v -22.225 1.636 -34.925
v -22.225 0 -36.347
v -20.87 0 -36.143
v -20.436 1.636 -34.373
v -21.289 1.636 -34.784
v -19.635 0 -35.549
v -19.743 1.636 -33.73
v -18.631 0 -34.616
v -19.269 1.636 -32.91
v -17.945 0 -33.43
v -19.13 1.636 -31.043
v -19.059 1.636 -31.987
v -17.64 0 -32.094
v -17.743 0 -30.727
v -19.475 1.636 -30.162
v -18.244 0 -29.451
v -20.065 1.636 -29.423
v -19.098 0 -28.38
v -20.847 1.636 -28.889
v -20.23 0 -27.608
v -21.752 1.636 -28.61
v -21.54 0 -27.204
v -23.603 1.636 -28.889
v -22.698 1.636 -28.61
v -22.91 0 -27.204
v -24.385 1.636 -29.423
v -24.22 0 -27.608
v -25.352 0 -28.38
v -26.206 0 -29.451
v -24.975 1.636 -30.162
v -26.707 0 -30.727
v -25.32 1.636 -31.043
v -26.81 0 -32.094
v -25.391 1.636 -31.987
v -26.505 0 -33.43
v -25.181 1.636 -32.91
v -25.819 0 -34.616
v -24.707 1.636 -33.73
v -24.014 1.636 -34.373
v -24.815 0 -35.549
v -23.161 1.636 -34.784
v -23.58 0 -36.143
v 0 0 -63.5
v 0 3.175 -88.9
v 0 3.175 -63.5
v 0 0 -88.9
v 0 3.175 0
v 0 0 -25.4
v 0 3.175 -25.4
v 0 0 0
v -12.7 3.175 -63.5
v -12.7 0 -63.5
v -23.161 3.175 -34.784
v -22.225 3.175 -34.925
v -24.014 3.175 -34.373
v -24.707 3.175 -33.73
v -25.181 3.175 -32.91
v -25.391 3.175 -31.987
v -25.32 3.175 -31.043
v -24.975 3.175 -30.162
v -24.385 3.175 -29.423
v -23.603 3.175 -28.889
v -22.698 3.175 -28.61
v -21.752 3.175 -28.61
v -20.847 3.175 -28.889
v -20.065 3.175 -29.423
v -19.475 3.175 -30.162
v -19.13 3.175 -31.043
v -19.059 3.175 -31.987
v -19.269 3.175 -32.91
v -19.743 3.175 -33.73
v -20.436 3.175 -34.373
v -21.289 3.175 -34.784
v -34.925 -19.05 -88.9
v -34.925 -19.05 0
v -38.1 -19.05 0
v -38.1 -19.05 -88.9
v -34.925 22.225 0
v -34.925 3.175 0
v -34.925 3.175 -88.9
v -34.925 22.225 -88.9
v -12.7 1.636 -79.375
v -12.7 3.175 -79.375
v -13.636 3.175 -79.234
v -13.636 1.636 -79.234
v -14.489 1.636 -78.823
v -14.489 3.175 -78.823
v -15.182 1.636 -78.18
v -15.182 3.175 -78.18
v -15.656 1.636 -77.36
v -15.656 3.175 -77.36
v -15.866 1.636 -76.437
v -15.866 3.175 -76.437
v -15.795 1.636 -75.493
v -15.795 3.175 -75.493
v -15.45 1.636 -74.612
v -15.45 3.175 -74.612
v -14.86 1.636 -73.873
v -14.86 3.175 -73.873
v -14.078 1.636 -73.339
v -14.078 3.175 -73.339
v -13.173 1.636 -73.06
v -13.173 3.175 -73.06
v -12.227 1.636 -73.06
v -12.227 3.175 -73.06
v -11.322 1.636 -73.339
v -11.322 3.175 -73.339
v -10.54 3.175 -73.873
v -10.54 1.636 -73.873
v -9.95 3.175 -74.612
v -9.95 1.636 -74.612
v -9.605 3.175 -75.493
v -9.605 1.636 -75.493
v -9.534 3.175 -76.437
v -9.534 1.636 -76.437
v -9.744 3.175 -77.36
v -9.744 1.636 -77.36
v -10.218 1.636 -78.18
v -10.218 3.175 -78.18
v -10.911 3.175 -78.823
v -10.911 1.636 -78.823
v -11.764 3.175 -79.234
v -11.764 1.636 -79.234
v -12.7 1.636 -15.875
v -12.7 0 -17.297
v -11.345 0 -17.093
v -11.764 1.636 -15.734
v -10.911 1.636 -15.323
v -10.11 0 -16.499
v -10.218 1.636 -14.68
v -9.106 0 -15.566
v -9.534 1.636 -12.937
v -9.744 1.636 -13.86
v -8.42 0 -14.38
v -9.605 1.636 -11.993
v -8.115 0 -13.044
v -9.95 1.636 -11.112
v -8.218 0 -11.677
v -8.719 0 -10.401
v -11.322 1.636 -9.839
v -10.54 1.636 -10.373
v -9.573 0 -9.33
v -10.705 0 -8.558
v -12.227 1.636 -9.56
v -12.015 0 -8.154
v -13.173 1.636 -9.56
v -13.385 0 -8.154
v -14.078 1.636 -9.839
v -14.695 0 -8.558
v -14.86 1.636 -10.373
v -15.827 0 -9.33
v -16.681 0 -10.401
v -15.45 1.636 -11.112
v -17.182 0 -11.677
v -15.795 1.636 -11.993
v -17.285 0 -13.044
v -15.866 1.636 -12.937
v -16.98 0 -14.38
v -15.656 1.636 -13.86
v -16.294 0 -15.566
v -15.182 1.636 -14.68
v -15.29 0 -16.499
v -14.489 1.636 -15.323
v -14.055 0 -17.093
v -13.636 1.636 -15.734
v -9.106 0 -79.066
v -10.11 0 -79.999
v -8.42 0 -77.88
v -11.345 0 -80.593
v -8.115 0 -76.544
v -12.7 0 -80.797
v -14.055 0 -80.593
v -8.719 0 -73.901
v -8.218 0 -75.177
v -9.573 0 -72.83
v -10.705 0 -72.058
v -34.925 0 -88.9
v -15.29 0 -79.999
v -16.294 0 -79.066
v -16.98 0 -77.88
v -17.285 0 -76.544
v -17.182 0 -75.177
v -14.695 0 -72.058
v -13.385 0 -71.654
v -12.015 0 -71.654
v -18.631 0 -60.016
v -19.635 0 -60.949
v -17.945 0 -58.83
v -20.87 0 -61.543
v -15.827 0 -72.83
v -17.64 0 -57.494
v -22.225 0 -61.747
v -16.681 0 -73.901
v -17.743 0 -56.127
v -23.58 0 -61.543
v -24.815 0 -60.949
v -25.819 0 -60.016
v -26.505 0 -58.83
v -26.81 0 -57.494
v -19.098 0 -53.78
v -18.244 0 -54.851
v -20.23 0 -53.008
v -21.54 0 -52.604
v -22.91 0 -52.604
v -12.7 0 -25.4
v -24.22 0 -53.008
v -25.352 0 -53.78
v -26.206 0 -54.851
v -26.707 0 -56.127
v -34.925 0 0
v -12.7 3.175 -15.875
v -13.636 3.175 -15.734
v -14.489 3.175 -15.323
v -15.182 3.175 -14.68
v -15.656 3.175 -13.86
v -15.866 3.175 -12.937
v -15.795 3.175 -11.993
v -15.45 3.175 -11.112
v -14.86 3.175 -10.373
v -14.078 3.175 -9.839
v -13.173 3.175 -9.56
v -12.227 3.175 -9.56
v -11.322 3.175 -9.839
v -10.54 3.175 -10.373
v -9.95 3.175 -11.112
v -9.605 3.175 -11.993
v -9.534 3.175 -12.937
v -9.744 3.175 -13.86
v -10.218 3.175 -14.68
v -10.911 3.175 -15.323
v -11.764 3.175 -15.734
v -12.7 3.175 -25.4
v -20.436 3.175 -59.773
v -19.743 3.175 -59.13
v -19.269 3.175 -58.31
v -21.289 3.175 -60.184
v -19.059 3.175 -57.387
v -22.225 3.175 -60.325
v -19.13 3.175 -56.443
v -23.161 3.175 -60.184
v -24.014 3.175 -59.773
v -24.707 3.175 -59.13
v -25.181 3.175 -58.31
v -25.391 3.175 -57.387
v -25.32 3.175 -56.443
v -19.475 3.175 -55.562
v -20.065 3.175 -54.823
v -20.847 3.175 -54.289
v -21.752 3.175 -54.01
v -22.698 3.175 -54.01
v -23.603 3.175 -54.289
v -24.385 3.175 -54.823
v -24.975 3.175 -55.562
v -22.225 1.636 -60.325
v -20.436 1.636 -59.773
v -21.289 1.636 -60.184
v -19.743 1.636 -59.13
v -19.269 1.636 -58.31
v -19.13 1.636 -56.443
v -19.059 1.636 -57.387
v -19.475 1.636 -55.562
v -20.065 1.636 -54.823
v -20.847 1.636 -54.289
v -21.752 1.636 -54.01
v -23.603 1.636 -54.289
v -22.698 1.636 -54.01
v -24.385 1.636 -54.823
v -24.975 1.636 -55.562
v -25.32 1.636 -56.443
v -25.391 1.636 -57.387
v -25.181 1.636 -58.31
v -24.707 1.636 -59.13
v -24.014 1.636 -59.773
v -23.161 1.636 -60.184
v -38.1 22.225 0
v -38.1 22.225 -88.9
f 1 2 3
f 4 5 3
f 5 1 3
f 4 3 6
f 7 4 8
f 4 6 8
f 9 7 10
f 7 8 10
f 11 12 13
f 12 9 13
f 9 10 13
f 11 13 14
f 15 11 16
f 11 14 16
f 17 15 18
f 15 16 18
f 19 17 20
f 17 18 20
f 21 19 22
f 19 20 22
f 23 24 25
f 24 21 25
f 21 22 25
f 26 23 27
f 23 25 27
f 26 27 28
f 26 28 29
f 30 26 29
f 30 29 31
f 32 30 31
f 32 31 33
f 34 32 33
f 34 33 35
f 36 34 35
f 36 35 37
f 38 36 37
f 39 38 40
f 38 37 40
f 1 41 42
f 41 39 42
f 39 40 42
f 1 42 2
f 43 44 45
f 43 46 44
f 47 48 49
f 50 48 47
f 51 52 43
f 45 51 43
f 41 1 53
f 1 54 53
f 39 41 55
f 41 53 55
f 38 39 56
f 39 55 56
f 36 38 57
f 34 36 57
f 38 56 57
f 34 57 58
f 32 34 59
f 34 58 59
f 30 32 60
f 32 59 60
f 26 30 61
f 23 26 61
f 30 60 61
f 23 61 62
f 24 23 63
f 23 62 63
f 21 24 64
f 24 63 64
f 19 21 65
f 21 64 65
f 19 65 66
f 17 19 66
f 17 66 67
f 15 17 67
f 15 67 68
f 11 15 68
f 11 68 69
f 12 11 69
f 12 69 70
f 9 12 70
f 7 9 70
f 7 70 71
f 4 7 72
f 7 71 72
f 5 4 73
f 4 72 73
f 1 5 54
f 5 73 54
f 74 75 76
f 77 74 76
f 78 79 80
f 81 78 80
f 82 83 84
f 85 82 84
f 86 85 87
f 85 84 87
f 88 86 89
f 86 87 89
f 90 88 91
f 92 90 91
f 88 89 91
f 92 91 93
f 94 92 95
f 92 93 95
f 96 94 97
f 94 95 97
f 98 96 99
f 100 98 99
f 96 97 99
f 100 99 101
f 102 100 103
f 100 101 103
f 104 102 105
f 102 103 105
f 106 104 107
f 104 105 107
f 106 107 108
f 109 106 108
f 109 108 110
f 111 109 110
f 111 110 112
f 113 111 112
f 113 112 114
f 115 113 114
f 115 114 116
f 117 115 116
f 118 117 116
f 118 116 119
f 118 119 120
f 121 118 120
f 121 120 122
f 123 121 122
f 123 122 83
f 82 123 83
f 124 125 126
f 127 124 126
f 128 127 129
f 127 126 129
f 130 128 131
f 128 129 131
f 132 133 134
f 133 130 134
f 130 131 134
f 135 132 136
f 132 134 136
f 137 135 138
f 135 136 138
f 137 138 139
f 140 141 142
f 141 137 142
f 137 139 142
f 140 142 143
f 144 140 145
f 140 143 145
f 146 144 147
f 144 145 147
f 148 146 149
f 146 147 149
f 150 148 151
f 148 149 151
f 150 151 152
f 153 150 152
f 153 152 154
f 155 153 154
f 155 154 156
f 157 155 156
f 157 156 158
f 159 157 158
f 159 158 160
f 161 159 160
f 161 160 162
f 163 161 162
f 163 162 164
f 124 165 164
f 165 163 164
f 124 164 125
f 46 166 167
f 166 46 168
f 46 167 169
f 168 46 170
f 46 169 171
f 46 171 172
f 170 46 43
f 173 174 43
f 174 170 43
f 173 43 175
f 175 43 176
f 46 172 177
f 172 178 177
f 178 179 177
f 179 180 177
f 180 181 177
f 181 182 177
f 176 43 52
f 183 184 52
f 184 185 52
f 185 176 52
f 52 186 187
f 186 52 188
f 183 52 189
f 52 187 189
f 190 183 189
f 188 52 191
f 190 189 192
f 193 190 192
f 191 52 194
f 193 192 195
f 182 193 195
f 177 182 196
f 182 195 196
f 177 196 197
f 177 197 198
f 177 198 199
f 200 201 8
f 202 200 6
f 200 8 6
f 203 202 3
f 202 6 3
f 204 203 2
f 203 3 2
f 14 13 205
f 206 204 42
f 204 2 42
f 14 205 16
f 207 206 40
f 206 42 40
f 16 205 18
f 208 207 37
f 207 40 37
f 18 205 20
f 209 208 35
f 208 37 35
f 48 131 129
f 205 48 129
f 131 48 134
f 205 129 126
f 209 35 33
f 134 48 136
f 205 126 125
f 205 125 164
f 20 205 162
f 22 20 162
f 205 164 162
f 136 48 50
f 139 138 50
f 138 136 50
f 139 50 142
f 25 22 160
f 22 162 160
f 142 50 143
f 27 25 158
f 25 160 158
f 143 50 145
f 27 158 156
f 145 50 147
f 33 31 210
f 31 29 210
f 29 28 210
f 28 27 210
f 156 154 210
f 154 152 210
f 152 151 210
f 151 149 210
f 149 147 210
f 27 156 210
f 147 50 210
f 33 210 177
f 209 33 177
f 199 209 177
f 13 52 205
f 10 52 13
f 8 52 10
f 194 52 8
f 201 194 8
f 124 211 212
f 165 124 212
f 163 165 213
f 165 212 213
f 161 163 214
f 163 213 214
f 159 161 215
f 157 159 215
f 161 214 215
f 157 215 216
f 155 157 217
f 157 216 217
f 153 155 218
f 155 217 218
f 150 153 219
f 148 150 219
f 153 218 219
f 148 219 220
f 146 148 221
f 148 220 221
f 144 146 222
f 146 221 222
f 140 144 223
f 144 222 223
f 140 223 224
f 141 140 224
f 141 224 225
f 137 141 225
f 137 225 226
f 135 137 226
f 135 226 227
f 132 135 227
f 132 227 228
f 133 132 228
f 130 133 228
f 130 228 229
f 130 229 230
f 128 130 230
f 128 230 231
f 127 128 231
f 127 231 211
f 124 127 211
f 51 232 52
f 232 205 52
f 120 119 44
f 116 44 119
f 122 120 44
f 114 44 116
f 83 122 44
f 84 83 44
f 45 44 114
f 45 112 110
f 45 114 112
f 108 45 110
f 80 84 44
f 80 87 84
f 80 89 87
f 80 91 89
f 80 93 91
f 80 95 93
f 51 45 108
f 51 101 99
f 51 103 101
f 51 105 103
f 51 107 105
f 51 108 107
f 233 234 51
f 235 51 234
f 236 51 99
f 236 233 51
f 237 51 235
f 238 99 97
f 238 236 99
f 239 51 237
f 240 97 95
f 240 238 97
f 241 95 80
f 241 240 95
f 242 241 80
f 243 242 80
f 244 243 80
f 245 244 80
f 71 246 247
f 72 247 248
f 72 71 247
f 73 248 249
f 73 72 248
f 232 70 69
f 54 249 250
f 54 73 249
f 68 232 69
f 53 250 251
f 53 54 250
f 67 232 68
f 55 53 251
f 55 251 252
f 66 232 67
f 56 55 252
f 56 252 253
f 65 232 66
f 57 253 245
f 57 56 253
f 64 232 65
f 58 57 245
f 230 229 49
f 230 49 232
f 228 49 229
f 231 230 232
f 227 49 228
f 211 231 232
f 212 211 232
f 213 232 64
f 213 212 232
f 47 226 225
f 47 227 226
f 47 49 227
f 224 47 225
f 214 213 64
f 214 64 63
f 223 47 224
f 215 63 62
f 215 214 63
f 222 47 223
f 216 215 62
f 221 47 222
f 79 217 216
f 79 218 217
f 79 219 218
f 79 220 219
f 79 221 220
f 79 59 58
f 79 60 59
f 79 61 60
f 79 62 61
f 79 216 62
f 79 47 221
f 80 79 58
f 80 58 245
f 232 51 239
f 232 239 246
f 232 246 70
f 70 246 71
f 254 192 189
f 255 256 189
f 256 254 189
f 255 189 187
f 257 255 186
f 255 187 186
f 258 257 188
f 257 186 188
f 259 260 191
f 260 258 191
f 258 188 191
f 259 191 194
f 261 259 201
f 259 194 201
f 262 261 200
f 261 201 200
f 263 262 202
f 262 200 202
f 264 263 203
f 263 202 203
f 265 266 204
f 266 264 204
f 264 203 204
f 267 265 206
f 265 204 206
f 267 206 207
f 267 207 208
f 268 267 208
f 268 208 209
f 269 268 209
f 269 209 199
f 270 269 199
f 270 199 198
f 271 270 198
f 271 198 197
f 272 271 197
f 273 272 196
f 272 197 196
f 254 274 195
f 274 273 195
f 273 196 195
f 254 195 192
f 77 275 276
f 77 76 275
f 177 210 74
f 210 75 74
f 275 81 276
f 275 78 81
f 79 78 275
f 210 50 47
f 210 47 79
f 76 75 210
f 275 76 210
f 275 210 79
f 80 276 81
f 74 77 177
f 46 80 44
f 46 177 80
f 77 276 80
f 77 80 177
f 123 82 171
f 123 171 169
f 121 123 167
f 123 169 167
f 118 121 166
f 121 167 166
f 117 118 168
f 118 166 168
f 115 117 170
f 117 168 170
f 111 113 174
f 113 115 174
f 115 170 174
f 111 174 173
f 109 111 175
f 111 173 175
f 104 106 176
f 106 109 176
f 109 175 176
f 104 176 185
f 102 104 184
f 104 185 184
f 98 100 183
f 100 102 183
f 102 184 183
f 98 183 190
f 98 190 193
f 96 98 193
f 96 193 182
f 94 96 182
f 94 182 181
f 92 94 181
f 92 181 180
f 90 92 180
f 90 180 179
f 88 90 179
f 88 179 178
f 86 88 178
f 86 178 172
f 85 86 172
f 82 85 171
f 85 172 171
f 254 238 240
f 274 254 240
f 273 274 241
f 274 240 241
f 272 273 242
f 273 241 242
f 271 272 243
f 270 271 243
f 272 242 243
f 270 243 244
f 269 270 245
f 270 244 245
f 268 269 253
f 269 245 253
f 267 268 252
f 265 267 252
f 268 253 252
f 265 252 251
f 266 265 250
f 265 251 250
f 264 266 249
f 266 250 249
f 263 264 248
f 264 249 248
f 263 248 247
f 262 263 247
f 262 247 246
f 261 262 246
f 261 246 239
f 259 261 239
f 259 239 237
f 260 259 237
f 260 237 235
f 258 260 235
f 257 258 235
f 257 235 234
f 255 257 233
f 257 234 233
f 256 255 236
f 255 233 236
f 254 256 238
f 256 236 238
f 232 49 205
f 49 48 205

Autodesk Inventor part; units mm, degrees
ref_plane "YZ Plane" through (0, 0, 0) normal (1, 0, 0) x (0, 1, 0)
ref_plane "XZ Plane" through (0, 0, 0) normal (0, 1, 0) x (-1, 0, 0)
ref_plane "XY Plane" through (0, 0, 0) normal (0, 0, 1) x (1, 0, 0)
sketch "Sketch1" plane through (0, 0, 0) normal (0, 1, 0) x (-1, 0, 0)
  line L0 (0, 0) -> (38.1, 0)
  line L1 (38.1, 0) -> (38.1, -88.9)
  line L2 (38.1, -88.9) -> (0, -88.9)
  line L3 (0, -25.4) -> (12.7, -25.4)
  line L4 (12.7, -25.4) -> (12.7, -63.5)
  line L5 (12.7, -63.5) -> (0, -63.5)
  line L6 (0, -88.9) -> (0, -63.5)
  line L7 (0, -25.4) -> (0, 0)
  line L8 (38.1, 0) -> (34.925, 0)
  line L9 (34.925, 0) -> (34.925, -88.9)
  line L10 (34.925, -88.9) -> (38.1, -88.9)
  line L11 (38.1, -88.9) -> (38.1, 0)
  point P0 (12.7, -12.7)
  point P1 (22.225, -31.75)
  point P2 (22.225, -57.15)
  point P3 (12.7, -76.2)
  dimension "d0" = 38.1
  dimension "d1" = 88.9
  dimension "d3" = 38.1
  dimension "d4" = 25.4
  dimension "d5" = 12.7
  dimension "d6" = 12.7
  dimension "d7" = 12.7
  dimension "d8" = 12.7
  dimension "d9" = 15.875
  dimension "d10" = 15.875
  dimension "d11" = 31.75
  dimension "d12" = 31.75
  dimension "d13" = 3.175
  dimension "d35" = 12.7
extrude "Extrusion1" add sketch "Sketch1" along normal blind 3.175
hole "Hole1" at (-12.7, 0, -12.7) at (-22.225, 0, -31.75) at (-22.225, 0, -57.15) at (-12.7, 0, -76.2) direction (0, 1, 0) diameter 6.35 depth 3.175 countersink diameter 9.1948 countersink angle 82
extrude "Extrusion2" add sketch "Sketch1" along normal blind 22.225 and the other way blind 19.05 contours L0 L1 L2 L9
thread "Thread1" size "1/4-20 UNC" class "2B" standard "ANSI Unified Screw Threads" full length
thread "Thread2" size "1/4-20 UNC" class "2B" standard "ANSI Unified Screw Threads" full length
thread "Thread3" size "1/4-20 UNC" class "2B" standard "ANSI Unified Screw Threads" full length
thread "Thread4" size "1/4-20 UNC" class "2B" standard "ANSI Unified Screw Threads" full length
equation "\"d9\" = d10"
properties part number "t 2 piece" material "Aluminum 6061"
